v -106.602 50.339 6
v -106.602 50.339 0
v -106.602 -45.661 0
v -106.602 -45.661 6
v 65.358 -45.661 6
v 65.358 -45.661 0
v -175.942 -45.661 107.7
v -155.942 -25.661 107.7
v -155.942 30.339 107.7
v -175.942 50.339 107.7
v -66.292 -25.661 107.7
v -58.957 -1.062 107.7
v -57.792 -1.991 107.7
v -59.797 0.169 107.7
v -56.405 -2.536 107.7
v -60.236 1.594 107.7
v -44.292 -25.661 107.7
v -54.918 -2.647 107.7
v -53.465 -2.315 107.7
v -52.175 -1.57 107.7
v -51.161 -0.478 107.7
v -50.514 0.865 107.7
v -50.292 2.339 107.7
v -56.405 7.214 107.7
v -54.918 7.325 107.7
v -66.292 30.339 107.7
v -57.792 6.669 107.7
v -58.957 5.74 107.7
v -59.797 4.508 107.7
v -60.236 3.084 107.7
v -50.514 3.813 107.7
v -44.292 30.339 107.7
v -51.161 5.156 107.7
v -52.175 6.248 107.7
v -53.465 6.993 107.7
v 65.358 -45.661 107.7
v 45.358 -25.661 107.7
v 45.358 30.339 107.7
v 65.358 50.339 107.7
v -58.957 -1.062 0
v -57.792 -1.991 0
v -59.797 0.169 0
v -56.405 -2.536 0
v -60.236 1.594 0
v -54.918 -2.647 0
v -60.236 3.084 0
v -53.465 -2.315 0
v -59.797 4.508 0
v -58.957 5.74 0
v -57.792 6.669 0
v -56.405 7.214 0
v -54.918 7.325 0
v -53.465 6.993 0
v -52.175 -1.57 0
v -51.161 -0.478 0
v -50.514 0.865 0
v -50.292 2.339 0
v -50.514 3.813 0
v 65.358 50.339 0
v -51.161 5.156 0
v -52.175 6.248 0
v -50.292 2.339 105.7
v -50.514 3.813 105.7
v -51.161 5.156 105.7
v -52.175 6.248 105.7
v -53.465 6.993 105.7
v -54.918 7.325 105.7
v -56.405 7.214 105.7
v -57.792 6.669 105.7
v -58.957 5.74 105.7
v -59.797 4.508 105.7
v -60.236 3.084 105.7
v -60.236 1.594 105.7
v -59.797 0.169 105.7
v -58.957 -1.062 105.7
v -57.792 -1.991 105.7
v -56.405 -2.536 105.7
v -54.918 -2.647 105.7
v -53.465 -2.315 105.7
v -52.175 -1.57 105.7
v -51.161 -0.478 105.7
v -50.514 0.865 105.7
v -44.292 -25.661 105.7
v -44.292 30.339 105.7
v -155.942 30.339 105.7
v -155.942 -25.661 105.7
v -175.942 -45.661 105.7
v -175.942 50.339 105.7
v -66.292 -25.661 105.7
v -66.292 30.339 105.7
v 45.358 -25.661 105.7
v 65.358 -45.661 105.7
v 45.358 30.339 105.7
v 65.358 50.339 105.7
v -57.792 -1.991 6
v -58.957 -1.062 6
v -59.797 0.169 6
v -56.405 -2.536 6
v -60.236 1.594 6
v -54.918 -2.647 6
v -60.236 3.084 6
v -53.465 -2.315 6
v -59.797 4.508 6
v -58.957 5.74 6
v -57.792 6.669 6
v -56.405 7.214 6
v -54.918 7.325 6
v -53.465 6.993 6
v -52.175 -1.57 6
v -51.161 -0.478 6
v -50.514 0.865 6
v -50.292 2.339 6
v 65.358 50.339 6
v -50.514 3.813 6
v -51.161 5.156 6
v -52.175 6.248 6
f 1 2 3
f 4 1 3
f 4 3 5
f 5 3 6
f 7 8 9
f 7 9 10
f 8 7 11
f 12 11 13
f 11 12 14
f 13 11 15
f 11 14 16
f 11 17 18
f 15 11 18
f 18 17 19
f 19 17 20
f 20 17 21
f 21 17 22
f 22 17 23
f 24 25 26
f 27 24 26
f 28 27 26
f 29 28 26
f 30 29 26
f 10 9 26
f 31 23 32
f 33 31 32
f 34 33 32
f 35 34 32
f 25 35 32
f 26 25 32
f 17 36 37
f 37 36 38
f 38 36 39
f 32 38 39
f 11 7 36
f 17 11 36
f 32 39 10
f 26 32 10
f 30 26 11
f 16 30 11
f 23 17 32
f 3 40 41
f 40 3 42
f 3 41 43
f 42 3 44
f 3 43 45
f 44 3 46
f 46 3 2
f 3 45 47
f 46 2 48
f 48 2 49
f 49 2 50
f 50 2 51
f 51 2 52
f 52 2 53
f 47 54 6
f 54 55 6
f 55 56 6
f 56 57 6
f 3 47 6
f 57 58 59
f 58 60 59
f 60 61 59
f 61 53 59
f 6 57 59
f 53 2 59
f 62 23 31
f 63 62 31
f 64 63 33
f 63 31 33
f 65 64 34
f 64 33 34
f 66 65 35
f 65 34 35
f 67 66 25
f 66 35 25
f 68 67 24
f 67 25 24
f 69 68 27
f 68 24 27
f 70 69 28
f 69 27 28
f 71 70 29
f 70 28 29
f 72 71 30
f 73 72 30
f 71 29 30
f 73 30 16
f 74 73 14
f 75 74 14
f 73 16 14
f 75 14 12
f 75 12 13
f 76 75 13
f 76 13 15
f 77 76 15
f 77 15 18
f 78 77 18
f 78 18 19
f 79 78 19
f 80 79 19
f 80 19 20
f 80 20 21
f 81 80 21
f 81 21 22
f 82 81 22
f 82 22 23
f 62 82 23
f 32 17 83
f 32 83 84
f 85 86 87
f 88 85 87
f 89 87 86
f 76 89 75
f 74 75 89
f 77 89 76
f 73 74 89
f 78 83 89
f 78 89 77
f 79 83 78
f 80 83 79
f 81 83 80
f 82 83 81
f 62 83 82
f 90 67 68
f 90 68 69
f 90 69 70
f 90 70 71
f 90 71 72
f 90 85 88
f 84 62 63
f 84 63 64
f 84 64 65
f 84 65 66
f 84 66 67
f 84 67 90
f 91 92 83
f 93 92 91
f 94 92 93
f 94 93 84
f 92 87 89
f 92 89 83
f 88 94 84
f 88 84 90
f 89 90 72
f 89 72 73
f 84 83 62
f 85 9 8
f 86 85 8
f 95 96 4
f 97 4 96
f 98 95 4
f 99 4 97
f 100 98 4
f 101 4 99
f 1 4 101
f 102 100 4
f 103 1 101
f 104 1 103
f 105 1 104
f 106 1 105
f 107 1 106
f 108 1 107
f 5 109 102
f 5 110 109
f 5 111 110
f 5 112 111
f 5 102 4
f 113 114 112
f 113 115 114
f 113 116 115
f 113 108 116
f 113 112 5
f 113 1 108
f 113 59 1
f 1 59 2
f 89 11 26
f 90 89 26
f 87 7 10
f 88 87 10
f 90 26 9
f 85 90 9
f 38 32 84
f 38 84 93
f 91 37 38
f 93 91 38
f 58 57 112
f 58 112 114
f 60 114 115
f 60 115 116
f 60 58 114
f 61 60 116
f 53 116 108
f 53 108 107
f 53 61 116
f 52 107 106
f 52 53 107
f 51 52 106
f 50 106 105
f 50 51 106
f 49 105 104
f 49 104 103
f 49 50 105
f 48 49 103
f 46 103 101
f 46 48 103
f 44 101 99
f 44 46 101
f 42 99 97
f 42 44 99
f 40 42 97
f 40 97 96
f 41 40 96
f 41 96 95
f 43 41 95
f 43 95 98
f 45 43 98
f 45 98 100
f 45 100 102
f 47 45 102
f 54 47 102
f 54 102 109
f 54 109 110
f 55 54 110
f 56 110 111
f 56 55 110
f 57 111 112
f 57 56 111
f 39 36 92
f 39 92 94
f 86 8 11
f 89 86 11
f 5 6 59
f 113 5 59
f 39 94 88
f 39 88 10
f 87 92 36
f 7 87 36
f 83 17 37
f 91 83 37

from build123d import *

# Parameters (mm, degrees)
F0_R     = 5
F1_DEPTH = 6
F2_W     = 96
F2_H     = 2
F3_DEPTH = 241.3
F5_DEPTH = 25
F4_W     = 89.65
F4_H     = 56
F4_R     = 5
F6_DEPTH = 25


with BuildPart() as f1:
    # F0 (on Top) → F1 (new body)
    with BuildSketch(Plane.XY):
        Polygon((65.358043, 50.338901), (-106.601957, 50.338901), (-106.601957, -45.661099), (65.358043, -45.661099), (65.358043, 2.338901), align=None)
        with Locations((-55.291957, 2.338901)):
            Circle(F0_R, mode=Mode.SUBTRACT)
    extrude(amount=F1_DEPTH)


with BuildPart() as f3:
    # F2 (on face) → F3 (new body)
    with BuildSketch(Plane.YZ.offset(65.358043)):
        with Locations((2.338901, 106.7)):
            Rectangle(F2_W, F2_H)
    extrude(amount=-F3_DEPTH)

    # F4 (on face) → F5 (cut)
    with BuildSketch(Plane.XY.offset(107.7)):
        Polygon((-66.291957, 30.338901), (-155.941957, 30.338901), (-155.941957, -25.661099), (-66.291957, -25.661099), (-66.291957, 2.338901), align=None)
    extrude(amount=-F5_DEPTH, mode=Mode.SUBTRACT)

    # F4 (on face) → F6 (cut)
    with BuildSketch(Plane.XY.offset(107.7)):
        with Locations((0.533043, 2.338901)):
            Rectangle(F4_W, F4_H)
        with Locations((-55.291957, 2.338901)):
            Circle(F4_R)
    extrude(amount=-F6_DEPTH, mode=Mode.SUBTRACT)


solid = Compound([f1.part, f3.part])
